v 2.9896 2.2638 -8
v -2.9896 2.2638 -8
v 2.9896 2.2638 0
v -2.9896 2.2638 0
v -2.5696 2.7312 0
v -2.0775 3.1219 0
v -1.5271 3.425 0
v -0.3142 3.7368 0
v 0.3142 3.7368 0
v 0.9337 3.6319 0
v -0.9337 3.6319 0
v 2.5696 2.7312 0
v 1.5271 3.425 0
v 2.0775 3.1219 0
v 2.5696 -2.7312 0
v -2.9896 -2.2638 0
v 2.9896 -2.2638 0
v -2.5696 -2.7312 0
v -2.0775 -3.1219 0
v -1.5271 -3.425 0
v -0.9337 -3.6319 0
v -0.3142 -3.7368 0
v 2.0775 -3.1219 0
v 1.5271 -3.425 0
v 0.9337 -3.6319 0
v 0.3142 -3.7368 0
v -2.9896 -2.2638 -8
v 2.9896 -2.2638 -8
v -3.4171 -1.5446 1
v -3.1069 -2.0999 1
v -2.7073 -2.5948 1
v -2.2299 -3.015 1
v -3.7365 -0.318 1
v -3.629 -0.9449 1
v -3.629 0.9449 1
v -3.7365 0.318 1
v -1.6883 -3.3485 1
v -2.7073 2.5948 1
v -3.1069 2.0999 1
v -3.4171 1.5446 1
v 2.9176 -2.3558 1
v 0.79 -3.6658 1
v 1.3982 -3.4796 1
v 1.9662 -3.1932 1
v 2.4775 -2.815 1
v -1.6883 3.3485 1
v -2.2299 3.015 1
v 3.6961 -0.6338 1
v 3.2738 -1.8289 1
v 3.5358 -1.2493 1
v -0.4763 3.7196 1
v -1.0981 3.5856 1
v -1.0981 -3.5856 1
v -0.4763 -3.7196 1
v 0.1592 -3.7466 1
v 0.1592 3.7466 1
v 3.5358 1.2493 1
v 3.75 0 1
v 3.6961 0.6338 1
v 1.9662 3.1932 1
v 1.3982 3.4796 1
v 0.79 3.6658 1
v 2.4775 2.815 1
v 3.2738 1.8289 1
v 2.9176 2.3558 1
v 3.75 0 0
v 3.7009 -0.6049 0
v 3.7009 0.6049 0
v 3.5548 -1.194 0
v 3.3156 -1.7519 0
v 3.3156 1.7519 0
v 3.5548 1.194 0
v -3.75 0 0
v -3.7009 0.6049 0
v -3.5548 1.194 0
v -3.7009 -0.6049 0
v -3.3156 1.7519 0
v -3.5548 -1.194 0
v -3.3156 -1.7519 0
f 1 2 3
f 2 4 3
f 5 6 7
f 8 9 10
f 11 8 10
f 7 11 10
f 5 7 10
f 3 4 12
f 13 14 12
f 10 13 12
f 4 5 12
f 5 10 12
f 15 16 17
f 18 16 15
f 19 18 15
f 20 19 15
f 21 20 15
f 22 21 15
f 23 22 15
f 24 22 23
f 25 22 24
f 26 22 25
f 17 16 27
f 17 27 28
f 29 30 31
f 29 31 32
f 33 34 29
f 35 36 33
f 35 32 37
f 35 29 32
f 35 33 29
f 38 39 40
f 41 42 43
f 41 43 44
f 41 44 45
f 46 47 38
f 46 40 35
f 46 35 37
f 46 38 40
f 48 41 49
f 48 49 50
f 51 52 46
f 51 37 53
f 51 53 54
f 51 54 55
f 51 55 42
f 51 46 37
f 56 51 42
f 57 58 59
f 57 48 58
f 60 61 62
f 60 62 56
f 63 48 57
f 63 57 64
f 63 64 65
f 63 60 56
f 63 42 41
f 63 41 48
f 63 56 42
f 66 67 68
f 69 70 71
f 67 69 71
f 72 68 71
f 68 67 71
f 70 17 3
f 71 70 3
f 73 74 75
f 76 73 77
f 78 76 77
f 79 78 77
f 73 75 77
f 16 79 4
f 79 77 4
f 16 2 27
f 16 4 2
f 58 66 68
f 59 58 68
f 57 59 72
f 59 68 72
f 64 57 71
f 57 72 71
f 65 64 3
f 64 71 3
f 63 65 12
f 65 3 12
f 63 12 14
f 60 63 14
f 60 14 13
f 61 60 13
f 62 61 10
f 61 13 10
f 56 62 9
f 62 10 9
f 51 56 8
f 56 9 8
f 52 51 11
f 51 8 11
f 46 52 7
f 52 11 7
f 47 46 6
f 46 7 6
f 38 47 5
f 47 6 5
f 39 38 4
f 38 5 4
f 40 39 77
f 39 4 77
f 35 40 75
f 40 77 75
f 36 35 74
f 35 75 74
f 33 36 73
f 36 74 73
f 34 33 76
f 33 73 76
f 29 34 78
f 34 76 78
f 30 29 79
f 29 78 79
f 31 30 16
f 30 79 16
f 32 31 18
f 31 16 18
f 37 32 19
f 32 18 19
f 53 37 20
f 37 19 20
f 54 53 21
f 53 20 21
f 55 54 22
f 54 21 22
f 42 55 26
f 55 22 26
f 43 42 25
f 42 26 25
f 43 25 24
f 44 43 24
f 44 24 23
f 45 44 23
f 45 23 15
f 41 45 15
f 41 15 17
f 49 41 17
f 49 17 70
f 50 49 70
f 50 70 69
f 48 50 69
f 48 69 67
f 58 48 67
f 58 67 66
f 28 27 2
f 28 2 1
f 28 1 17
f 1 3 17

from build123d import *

# Parameters (mm, degrees)
F2_R     = 3.75
F3_DEPTH = 1
F4_W     = 5.9792066569
F4_H     = 4.5275918273
F5_DEPTH = 3
F6_DEPTH = 5


# Not quite as in the source:
# - the program builds the solid bodies; features that only make, move or delete a surface that nothing else refers to are left out


with BuildPart() as f3:
    # F2 (on Top) → F3 (new body)
    with BuildSketch(Plane.XY):
        Circle(F2_R)
    extrude(amount=F3_DEPTH)

    # F4 (on face) → F5 (join)
    with BuildSketch(Plane(origin=(0, 0, 0), x_dir=(1, 0, 0), z_dir=(0, 0, -1))):
        Rectangle(F4_W, F4_H)
    extrude(amount=F5_DEPTH)

    # F6 (add): a face of the model
    f6_faces = [f3.faces().sort_by_distance(p)[0] for p in [
        (0, 0, -3),
    ]]
    extrude(f6_faces, amount=F6_DEPTH)


solid = f3.part
